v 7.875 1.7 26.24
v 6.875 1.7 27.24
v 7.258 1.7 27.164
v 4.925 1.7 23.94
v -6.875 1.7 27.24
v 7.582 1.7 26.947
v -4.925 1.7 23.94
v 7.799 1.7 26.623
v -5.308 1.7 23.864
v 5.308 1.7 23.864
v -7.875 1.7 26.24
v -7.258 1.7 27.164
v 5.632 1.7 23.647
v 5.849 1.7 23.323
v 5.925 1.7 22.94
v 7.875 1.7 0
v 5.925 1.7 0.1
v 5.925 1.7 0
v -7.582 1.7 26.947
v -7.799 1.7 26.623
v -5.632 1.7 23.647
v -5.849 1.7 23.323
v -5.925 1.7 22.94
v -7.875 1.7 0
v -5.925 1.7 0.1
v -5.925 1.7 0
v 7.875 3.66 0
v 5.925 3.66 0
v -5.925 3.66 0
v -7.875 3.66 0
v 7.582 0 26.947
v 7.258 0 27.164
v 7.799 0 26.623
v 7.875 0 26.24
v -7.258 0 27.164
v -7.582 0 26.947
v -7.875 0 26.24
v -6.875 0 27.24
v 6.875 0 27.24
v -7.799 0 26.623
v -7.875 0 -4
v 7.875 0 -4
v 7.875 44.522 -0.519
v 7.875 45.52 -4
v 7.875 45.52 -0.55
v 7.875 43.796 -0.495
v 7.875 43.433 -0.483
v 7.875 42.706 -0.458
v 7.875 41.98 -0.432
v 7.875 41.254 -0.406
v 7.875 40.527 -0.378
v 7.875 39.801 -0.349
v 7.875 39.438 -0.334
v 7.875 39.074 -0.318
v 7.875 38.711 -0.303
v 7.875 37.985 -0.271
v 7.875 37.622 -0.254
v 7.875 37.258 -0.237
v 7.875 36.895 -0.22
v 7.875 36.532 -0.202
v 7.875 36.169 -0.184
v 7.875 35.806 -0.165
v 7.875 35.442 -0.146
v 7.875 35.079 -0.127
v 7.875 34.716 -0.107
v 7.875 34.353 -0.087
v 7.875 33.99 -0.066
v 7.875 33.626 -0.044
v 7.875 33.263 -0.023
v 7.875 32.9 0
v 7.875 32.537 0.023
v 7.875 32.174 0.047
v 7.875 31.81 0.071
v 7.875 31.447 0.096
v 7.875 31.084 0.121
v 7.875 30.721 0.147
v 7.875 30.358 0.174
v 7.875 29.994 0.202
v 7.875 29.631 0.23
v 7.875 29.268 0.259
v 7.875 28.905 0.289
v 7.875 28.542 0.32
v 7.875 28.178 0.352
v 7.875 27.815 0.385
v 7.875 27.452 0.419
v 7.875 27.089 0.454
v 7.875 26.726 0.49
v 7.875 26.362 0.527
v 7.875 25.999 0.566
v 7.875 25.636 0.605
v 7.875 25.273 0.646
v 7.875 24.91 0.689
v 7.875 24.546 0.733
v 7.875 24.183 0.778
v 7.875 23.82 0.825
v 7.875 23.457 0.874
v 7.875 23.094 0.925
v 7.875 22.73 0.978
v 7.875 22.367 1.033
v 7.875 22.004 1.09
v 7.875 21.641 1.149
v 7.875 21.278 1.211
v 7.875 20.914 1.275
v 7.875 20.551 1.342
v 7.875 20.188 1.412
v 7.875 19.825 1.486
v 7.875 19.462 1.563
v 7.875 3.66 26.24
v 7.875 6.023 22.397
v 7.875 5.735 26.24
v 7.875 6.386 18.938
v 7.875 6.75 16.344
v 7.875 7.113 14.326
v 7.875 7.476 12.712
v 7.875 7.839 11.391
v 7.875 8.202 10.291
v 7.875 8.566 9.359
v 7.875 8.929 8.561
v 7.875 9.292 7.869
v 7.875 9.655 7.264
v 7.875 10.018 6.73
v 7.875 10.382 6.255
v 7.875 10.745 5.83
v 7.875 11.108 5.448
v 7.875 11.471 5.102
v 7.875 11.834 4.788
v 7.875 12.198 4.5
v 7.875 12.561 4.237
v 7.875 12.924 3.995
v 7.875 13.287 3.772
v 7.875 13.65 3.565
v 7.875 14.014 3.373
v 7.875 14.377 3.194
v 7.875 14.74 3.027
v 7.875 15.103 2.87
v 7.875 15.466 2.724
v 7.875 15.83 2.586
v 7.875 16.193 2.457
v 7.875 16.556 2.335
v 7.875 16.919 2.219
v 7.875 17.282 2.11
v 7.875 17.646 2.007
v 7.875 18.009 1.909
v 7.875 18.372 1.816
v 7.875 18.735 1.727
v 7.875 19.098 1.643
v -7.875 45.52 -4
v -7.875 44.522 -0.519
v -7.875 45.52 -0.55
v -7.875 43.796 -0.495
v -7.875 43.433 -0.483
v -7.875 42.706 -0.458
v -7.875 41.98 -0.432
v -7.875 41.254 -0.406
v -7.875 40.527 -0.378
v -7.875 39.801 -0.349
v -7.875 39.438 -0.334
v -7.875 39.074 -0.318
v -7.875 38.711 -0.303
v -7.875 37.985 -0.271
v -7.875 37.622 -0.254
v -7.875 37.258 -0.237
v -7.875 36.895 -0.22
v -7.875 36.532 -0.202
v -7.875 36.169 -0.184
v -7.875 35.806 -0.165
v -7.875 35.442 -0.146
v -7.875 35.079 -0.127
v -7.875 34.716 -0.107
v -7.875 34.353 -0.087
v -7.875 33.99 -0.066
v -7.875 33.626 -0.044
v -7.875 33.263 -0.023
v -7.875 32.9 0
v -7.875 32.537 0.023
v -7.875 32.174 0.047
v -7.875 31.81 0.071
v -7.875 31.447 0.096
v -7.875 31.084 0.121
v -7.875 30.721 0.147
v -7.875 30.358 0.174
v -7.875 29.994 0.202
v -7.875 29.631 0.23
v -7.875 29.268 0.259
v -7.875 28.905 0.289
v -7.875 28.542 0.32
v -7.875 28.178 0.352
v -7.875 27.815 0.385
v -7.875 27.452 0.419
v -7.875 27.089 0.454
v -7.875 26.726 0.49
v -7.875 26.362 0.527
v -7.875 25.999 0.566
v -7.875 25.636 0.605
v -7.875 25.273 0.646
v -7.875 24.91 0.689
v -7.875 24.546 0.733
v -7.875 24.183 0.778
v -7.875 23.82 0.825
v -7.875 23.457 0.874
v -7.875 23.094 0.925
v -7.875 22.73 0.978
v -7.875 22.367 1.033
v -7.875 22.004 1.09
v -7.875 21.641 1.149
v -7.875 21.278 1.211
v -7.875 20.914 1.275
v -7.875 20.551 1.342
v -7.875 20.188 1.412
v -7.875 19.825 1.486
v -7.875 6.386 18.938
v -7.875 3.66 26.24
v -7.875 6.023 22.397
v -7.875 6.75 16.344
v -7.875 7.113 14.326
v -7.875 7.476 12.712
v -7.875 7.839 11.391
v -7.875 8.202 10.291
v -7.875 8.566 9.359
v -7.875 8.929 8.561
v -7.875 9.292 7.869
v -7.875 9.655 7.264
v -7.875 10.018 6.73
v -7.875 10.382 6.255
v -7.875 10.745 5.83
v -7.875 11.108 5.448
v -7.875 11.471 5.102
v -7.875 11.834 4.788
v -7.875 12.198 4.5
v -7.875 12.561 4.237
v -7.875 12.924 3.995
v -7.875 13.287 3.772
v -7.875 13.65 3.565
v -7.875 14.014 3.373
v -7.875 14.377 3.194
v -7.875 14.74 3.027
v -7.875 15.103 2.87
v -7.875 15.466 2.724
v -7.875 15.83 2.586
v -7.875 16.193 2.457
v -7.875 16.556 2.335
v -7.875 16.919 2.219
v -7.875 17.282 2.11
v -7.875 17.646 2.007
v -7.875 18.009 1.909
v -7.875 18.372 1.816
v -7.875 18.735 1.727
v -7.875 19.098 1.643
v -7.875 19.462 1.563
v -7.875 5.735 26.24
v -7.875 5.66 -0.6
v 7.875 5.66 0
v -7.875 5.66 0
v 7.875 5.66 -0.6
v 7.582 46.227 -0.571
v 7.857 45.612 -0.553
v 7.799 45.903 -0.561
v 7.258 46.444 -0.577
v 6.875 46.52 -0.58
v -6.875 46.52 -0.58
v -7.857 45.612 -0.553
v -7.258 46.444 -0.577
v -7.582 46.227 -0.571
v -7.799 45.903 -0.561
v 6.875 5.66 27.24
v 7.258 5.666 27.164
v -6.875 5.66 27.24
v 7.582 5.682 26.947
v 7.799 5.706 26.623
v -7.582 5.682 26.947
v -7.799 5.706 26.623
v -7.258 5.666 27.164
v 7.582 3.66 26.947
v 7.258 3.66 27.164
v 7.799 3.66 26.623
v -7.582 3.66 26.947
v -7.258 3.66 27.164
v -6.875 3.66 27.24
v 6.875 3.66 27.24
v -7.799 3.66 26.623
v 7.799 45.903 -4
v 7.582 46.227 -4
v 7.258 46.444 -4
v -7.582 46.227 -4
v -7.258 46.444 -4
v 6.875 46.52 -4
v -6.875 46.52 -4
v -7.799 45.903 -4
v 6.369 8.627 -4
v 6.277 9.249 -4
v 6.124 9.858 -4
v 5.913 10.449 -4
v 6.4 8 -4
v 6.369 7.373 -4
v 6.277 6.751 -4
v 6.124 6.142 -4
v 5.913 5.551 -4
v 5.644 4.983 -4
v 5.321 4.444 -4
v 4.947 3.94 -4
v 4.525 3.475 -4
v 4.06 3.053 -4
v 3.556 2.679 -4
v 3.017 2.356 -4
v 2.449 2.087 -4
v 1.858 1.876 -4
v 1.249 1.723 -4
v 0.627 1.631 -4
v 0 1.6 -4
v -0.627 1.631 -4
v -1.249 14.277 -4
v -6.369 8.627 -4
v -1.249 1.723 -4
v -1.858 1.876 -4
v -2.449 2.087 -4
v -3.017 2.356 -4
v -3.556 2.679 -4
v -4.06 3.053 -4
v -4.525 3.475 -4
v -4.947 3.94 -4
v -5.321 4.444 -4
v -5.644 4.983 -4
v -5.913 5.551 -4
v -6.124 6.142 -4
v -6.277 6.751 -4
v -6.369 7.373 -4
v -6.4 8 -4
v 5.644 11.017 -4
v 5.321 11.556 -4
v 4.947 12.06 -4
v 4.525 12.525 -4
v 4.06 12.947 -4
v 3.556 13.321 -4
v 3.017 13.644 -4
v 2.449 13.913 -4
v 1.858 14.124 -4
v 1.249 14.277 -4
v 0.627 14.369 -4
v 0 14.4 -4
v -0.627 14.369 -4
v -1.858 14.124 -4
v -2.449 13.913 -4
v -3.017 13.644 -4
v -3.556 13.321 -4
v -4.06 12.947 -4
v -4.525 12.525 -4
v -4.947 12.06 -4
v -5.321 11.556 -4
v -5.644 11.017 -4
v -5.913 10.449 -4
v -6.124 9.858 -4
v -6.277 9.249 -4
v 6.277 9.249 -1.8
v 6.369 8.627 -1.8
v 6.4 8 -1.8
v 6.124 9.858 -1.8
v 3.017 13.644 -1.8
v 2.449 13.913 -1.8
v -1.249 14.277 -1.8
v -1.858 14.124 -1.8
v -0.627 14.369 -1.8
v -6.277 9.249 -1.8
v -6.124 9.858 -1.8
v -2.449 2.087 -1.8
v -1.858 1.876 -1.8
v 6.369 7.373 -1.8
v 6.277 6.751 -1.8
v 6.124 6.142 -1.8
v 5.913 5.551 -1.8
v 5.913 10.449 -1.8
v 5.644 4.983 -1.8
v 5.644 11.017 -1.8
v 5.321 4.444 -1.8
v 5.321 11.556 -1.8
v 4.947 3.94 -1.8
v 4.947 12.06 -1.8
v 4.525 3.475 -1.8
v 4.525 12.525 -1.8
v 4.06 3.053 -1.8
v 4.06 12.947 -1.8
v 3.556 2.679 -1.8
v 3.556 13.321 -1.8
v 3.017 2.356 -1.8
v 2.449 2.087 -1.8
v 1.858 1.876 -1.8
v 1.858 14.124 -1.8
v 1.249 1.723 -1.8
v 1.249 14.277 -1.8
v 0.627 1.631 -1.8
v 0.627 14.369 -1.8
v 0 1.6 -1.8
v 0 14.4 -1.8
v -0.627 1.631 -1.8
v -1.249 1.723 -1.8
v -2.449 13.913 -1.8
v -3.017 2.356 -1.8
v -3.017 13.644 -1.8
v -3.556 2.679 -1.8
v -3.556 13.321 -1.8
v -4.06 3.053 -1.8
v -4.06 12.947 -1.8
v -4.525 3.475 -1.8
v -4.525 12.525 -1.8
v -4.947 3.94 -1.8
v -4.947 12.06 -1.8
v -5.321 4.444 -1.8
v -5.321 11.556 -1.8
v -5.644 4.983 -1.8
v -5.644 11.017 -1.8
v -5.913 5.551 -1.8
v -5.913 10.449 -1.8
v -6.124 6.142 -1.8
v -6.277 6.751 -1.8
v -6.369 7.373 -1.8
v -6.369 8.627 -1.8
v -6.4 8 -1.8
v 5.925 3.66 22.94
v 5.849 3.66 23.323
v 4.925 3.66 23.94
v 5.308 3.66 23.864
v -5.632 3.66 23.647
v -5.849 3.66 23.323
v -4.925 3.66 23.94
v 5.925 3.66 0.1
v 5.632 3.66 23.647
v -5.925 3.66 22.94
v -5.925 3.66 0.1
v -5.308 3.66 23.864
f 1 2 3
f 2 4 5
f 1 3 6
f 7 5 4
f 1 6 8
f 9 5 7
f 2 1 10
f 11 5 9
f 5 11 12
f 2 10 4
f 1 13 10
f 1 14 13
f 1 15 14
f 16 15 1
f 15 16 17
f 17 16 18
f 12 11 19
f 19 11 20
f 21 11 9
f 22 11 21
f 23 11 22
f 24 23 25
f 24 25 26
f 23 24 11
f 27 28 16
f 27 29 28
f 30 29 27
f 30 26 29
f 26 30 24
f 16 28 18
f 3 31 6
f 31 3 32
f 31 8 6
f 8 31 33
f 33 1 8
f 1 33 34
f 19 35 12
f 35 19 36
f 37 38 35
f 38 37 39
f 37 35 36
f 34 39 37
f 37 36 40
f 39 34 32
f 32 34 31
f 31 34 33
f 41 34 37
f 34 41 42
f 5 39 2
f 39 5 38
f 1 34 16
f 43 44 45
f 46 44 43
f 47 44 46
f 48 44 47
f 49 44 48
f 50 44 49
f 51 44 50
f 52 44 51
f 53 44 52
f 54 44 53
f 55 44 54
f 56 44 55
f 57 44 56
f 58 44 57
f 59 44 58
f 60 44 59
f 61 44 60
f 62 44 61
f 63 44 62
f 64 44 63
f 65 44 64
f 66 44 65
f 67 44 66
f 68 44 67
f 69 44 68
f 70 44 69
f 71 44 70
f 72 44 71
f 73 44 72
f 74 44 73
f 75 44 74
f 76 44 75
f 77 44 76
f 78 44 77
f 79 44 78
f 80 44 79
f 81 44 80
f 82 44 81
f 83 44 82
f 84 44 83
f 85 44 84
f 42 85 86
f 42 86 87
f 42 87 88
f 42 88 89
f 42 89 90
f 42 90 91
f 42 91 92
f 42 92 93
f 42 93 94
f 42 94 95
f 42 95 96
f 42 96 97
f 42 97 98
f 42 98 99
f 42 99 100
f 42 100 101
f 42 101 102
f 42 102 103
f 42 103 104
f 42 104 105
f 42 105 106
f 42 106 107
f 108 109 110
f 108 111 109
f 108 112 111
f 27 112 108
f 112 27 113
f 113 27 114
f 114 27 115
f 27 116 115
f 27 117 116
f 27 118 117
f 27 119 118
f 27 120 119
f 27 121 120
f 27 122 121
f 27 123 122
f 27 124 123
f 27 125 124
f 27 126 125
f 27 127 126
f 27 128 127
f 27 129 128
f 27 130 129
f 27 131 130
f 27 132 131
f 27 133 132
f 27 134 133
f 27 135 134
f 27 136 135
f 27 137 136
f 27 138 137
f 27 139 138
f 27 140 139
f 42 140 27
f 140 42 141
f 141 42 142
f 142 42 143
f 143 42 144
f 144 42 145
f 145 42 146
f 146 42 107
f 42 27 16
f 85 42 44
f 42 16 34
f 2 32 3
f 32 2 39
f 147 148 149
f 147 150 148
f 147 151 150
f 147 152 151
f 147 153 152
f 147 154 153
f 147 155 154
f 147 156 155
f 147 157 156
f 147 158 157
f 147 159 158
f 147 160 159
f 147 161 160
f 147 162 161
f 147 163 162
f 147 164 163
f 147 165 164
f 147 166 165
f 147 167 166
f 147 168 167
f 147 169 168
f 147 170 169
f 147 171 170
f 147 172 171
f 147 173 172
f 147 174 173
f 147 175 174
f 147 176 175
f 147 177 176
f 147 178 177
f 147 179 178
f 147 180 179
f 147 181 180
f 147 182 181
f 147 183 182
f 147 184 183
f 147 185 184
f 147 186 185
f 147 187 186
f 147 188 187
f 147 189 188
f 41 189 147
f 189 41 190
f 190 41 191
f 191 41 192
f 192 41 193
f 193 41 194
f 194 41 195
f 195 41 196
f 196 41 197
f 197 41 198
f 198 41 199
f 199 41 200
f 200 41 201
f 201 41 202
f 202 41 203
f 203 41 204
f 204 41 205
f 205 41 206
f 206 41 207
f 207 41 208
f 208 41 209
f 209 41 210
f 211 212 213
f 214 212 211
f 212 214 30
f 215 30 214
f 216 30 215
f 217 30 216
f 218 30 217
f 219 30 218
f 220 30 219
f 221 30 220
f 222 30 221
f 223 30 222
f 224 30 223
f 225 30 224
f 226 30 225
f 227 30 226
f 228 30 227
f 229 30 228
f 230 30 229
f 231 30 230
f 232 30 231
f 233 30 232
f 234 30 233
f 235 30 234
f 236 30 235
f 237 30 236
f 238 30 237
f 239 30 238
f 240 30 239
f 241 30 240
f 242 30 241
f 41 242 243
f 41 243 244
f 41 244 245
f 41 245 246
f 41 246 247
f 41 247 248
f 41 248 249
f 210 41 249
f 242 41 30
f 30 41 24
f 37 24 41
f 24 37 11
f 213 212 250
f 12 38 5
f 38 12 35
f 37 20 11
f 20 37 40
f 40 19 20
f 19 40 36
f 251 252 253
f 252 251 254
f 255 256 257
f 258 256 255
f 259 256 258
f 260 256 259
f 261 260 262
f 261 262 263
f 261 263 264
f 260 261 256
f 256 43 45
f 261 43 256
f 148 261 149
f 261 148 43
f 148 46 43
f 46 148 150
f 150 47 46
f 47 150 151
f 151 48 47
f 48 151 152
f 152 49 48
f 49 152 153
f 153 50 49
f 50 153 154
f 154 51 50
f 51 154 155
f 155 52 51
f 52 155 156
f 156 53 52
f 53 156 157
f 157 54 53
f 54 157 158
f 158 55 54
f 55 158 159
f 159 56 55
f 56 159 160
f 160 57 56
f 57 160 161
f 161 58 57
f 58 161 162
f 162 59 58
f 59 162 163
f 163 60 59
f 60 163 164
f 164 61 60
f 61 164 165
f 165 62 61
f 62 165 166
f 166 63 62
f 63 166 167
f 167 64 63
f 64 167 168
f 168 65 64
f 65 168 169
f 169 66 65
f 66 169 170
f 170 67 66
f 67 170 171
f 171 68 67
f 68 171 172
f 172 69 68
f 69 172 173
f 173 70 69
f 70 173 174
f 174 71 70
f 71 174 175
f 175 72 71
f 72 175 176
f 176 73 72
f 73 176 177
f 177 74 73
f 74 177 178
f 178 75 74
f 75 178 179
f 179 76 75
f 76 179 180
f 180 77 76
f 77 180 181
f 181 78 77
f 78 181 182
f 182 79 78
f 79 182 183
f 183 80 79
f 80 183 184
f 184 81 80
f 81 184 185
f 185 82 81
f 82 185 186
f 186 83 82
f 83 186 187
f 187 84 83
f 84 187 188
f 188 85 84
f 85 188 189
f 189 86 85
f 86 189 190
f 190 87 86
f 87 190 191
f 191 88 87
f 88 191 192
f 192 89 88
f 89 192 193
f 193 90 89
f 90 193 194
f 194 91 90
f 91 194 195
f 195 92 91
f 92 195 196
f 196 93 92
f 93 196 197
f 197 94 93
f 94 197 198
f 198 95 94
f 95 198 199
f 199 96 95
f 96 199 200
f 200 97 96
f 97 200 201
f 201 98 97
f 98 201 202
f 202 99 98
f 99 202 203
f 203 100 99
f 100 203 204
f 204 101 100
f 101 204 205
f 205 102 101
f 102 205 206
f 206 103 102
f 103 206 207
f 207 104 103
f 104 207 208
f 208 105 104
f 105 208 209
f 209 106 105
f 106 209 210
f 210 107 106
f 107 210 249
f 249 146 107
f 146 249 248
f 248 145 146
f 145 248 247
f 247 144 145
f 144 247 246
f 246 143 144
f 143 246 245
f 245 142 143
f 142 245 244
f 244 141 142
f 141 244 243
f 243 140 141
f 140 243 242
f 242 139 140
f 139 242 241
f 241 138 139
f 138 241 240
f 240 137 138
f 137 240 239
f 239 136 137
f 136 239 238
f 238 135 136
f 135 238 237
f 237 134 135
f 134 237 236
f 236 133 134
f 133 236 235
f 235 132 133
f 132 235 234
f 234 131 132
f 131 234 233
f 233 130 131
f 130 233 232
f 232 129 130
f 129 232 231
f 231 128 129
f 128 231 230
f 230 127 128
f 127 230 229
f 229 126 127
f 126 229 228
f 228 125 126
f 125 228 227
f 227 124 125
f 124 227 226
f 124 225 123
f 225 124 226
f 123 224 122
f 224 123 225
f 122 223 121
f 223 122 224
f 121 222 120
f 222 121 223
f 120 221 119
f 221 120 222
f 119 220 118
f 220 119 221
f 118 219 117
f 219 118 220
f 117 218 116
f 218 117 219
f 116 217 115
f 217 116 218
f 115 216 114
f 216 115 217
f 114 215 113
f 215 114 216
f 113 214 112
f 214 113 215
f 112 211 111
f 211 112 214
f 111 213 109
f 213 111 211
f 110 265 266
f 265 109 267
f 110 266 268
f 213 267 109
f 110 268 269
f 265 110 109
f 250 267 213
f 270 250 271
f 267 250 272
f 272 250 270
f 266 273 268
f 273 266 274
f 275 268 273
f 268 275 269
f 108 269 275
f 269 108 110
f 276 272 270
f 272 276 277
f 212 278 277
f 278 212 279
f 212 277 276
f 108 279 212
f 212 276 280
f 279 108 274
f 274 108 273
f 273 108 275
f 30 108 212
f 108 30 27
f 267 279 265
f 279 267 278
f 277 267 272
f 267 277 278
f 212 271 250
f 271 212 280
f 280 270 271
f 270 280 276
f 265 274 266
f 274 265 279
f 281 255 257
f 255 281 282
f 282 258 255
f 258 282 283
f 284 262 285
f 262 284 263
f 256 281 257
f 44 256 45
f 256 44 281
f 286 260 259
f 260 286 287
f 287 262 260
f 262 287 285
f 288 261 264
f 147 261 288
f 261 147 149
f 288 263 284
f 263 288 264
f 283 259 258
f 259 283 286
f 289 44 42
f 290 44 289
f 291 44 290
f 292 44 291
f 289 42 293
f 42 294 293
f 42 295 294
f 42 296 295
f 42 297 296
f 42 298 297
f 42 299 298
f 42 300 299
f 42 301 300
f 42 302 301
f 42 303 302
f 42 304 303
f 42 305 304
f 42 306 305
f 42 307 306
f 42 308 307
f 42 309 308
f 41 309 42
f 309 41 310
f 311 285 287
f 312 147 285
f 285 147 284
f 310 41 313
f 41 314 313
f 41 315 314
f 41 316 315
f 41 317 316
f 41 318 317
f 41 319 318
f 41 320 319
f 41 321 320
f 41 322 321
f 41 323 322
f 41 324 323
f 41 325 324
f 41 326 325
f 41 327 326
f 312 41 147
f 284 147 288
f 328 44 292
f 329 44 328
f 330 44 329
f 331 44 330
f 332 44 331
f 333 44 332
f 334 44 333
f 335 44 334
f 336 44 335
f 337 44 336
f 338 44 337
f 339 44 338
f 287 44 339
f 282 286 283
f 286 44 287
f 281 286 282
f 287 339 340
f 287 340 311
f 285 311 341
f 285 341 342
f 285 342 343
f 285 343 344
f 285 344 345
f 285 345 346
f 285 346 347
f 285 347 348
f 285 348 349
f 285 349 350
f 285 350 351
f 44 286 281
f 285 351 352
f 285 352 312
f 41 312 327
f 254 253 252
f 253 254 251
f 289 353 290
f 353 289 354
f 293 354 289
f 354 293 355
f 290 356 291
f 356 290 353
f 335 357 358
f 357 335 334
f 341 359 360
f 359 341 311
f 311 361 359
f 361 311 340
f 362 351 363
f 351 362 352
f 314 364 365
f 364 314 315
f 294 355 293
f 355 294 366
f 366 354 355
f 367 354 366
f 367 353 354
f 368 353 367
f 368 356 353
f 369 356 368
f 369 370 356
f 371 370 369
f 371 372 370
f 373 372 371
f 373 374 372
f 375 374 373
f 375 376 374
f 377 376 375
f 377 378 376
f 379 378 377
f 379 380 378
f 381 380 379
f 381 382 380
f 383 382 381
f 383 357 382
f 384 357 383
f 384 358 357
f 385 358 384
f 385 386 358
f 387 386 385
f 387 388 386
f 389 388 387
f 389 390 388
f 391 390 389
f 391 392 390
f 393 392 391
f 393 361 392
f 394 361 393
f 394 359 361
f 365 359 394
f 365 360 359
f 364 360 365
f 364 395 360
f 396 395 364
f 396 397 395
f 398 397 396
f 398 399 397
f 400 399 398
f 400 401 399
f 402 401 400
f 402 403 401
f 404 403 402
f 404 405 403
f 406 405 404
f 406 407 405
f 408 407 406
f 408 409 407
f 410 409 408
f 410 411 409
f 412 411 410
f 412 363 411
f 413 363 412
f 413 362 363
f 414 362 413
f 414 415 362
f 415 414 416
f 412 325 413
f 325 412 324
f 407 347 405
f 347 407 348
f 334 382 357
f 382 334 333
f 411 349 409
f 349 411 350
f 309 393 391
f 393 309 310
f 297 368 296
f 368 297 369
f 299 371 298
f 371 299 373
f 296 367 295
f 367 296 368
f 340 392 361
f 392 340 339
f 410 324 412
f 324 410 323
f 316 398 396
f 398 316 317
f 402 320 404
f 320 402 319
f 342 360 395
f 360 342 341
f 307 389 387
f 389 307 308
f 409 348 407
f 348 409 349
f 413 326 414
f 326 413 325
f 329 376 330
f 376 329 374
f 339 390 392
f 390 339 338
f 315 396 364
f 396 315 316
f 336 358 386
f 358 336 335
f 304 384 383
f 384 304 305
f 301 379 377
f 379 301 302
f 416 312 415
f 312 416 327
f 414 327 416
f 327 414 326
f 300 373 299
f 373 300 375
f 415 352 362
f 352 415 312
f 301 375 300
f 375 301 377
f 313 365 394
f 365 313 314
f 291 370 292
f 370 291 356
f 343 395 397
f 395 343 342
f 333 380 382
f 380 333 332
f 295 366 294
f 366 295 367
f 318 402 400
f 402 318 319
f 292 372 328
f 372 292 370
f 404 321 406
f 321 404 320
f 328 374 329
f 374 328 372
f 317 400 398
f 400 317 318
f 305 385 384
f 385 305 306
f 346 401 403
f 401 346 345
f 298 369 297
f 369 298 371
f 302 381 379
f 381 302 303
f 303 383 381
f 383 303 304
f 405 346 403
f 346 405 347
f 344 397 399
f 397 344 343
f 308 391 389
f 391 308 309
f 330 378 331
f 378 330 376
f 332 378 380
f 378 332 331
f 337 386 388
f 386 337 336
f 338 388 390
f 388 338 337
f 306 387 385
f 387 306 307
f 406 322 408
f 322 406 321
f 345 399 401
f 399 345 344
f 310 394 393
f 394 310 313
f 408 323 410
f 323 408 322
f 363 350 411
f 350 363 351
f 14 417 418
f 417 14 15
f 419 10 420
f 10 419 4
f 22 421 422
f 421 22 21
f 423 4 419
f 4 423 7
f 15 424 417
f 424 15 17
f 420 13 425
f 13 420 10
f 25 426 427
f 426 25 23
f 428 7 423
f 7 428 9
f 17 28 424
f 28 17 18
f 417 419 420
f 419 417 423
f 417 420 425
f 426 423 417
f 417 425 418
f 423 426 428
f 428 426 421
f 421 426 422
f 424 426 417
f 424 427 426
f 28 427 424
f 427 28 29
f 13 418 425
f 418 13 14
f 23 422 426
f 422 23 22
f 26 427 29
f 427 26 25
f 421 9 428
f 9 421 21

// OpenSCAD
// Acer Acros 486 / Pentium desktop computer vertical orientation supports.
//
// The original are good but don't last 30 years of hard computing.
// Author: Joel Lehtonen

ura_h = 3.3;
ura_w = 11.85;
ura_d = 1.96;
tappi_h = 27.24;
tappi_w = 15.75;
tappi_inner_d_top = 1.7;
tappi_inner_d_bot = 1.7; //3.16;
tappi_roundness = 1;
tappi_outer_d = 2;
tappi_l = 40.86;
pohja_h = 4;
pohja_adj = 0.60;
jarru_dia = 12.8;
jarru_depth = 2.2;
jarru_y = 8;

module hulluus(w, h, d, scale=1) {
    mirror([0,1,0]) rotate([90,0,0]) linear_extrude(d, scale=scale) hull() {
        translate([-w/2,0,0]) square([w,0.1]);
        for(m = [0,1]) {
            mirror([m, 0, 0]) translate([w/2-tappi_roundness,h-tappi_roundness,0]) circle(r=tappi_roundness, $fn=16);
        }
    }
}

module triangle(w, h, d) {
    translate([0,0,-d/2]) linear_extrude(d) polygon([[0,0], [0,h], [w,h]]);
}

function inverse(start, end, step) =
    concat([[start,1/end]], [ for (x = [start : step : end]) [ x, 1/x] ]);

module ranni() {
    scale(1/(4-0.25)) translate([-0.25,-0.25,0]) polygon(inverse(0.25,6,0.05));
}

module leikkuuboksi() {
    intersection() {
        children();
        translate([0,0,50]) rotate([-90,0,0]) hulluus(tappi_w, tappi_inner_d_bot+ura_d+tappi_outer_d+tappi_l,100);
    }
}

// Slanted part
difference() {
    hulluus(tappi_w, tappi_h, tappi_inner_d_bot);
    rotate([90,0,90]) triangle(tappi_inner_d_bot-tappi_inner_d_top,tappi_h,tappi_w);
}

// Slot
translate([0,tappi_inner_d_bot,0]) hulluus(ura_w, tappi_h-ura_h, ura_d);

// Back part
leikkuuboksi() translate([0,tappi_inner_d_bot+ura_d,0]) {
    intersection() {
        translate([0,0,-pohja_h]) hulluus(tappi_w, tappi_h+pohja_h, tappi_l+tappi_outer_d);
        // Rounding
        union () {
            translate([0,0,50]) cube([100, 2*tappi_outer_d, 100], center=true);
            translate([0,tappi_outer_d,0]) rotate([90,0,90]) linear_extrude(tappi_w, center=true) scale(tappi_h) ranni();
        }
    }
}

// Bottom ja holetsu
leikkuuboksi() translate([0,0,-pohja_h]) difference() {
    translate([-tappi_w/2,0,0]) union() {
        cube([tappi_w,tappi_inner_d_bot+ura_d+tappi_outer_d+tappi_l,pohja_h-pohja_adj]);
        // Hotfix to fill a hole
        cube([tappi_w,tappi_inner_d_bot+ura_d+tappi_outer_d,pohja_h]);
    }        
    translate([0,jarru_y,0]) cylinder(jarru_depth, jarru_dia/2, jarru_dia/2, $fn=64);
}
